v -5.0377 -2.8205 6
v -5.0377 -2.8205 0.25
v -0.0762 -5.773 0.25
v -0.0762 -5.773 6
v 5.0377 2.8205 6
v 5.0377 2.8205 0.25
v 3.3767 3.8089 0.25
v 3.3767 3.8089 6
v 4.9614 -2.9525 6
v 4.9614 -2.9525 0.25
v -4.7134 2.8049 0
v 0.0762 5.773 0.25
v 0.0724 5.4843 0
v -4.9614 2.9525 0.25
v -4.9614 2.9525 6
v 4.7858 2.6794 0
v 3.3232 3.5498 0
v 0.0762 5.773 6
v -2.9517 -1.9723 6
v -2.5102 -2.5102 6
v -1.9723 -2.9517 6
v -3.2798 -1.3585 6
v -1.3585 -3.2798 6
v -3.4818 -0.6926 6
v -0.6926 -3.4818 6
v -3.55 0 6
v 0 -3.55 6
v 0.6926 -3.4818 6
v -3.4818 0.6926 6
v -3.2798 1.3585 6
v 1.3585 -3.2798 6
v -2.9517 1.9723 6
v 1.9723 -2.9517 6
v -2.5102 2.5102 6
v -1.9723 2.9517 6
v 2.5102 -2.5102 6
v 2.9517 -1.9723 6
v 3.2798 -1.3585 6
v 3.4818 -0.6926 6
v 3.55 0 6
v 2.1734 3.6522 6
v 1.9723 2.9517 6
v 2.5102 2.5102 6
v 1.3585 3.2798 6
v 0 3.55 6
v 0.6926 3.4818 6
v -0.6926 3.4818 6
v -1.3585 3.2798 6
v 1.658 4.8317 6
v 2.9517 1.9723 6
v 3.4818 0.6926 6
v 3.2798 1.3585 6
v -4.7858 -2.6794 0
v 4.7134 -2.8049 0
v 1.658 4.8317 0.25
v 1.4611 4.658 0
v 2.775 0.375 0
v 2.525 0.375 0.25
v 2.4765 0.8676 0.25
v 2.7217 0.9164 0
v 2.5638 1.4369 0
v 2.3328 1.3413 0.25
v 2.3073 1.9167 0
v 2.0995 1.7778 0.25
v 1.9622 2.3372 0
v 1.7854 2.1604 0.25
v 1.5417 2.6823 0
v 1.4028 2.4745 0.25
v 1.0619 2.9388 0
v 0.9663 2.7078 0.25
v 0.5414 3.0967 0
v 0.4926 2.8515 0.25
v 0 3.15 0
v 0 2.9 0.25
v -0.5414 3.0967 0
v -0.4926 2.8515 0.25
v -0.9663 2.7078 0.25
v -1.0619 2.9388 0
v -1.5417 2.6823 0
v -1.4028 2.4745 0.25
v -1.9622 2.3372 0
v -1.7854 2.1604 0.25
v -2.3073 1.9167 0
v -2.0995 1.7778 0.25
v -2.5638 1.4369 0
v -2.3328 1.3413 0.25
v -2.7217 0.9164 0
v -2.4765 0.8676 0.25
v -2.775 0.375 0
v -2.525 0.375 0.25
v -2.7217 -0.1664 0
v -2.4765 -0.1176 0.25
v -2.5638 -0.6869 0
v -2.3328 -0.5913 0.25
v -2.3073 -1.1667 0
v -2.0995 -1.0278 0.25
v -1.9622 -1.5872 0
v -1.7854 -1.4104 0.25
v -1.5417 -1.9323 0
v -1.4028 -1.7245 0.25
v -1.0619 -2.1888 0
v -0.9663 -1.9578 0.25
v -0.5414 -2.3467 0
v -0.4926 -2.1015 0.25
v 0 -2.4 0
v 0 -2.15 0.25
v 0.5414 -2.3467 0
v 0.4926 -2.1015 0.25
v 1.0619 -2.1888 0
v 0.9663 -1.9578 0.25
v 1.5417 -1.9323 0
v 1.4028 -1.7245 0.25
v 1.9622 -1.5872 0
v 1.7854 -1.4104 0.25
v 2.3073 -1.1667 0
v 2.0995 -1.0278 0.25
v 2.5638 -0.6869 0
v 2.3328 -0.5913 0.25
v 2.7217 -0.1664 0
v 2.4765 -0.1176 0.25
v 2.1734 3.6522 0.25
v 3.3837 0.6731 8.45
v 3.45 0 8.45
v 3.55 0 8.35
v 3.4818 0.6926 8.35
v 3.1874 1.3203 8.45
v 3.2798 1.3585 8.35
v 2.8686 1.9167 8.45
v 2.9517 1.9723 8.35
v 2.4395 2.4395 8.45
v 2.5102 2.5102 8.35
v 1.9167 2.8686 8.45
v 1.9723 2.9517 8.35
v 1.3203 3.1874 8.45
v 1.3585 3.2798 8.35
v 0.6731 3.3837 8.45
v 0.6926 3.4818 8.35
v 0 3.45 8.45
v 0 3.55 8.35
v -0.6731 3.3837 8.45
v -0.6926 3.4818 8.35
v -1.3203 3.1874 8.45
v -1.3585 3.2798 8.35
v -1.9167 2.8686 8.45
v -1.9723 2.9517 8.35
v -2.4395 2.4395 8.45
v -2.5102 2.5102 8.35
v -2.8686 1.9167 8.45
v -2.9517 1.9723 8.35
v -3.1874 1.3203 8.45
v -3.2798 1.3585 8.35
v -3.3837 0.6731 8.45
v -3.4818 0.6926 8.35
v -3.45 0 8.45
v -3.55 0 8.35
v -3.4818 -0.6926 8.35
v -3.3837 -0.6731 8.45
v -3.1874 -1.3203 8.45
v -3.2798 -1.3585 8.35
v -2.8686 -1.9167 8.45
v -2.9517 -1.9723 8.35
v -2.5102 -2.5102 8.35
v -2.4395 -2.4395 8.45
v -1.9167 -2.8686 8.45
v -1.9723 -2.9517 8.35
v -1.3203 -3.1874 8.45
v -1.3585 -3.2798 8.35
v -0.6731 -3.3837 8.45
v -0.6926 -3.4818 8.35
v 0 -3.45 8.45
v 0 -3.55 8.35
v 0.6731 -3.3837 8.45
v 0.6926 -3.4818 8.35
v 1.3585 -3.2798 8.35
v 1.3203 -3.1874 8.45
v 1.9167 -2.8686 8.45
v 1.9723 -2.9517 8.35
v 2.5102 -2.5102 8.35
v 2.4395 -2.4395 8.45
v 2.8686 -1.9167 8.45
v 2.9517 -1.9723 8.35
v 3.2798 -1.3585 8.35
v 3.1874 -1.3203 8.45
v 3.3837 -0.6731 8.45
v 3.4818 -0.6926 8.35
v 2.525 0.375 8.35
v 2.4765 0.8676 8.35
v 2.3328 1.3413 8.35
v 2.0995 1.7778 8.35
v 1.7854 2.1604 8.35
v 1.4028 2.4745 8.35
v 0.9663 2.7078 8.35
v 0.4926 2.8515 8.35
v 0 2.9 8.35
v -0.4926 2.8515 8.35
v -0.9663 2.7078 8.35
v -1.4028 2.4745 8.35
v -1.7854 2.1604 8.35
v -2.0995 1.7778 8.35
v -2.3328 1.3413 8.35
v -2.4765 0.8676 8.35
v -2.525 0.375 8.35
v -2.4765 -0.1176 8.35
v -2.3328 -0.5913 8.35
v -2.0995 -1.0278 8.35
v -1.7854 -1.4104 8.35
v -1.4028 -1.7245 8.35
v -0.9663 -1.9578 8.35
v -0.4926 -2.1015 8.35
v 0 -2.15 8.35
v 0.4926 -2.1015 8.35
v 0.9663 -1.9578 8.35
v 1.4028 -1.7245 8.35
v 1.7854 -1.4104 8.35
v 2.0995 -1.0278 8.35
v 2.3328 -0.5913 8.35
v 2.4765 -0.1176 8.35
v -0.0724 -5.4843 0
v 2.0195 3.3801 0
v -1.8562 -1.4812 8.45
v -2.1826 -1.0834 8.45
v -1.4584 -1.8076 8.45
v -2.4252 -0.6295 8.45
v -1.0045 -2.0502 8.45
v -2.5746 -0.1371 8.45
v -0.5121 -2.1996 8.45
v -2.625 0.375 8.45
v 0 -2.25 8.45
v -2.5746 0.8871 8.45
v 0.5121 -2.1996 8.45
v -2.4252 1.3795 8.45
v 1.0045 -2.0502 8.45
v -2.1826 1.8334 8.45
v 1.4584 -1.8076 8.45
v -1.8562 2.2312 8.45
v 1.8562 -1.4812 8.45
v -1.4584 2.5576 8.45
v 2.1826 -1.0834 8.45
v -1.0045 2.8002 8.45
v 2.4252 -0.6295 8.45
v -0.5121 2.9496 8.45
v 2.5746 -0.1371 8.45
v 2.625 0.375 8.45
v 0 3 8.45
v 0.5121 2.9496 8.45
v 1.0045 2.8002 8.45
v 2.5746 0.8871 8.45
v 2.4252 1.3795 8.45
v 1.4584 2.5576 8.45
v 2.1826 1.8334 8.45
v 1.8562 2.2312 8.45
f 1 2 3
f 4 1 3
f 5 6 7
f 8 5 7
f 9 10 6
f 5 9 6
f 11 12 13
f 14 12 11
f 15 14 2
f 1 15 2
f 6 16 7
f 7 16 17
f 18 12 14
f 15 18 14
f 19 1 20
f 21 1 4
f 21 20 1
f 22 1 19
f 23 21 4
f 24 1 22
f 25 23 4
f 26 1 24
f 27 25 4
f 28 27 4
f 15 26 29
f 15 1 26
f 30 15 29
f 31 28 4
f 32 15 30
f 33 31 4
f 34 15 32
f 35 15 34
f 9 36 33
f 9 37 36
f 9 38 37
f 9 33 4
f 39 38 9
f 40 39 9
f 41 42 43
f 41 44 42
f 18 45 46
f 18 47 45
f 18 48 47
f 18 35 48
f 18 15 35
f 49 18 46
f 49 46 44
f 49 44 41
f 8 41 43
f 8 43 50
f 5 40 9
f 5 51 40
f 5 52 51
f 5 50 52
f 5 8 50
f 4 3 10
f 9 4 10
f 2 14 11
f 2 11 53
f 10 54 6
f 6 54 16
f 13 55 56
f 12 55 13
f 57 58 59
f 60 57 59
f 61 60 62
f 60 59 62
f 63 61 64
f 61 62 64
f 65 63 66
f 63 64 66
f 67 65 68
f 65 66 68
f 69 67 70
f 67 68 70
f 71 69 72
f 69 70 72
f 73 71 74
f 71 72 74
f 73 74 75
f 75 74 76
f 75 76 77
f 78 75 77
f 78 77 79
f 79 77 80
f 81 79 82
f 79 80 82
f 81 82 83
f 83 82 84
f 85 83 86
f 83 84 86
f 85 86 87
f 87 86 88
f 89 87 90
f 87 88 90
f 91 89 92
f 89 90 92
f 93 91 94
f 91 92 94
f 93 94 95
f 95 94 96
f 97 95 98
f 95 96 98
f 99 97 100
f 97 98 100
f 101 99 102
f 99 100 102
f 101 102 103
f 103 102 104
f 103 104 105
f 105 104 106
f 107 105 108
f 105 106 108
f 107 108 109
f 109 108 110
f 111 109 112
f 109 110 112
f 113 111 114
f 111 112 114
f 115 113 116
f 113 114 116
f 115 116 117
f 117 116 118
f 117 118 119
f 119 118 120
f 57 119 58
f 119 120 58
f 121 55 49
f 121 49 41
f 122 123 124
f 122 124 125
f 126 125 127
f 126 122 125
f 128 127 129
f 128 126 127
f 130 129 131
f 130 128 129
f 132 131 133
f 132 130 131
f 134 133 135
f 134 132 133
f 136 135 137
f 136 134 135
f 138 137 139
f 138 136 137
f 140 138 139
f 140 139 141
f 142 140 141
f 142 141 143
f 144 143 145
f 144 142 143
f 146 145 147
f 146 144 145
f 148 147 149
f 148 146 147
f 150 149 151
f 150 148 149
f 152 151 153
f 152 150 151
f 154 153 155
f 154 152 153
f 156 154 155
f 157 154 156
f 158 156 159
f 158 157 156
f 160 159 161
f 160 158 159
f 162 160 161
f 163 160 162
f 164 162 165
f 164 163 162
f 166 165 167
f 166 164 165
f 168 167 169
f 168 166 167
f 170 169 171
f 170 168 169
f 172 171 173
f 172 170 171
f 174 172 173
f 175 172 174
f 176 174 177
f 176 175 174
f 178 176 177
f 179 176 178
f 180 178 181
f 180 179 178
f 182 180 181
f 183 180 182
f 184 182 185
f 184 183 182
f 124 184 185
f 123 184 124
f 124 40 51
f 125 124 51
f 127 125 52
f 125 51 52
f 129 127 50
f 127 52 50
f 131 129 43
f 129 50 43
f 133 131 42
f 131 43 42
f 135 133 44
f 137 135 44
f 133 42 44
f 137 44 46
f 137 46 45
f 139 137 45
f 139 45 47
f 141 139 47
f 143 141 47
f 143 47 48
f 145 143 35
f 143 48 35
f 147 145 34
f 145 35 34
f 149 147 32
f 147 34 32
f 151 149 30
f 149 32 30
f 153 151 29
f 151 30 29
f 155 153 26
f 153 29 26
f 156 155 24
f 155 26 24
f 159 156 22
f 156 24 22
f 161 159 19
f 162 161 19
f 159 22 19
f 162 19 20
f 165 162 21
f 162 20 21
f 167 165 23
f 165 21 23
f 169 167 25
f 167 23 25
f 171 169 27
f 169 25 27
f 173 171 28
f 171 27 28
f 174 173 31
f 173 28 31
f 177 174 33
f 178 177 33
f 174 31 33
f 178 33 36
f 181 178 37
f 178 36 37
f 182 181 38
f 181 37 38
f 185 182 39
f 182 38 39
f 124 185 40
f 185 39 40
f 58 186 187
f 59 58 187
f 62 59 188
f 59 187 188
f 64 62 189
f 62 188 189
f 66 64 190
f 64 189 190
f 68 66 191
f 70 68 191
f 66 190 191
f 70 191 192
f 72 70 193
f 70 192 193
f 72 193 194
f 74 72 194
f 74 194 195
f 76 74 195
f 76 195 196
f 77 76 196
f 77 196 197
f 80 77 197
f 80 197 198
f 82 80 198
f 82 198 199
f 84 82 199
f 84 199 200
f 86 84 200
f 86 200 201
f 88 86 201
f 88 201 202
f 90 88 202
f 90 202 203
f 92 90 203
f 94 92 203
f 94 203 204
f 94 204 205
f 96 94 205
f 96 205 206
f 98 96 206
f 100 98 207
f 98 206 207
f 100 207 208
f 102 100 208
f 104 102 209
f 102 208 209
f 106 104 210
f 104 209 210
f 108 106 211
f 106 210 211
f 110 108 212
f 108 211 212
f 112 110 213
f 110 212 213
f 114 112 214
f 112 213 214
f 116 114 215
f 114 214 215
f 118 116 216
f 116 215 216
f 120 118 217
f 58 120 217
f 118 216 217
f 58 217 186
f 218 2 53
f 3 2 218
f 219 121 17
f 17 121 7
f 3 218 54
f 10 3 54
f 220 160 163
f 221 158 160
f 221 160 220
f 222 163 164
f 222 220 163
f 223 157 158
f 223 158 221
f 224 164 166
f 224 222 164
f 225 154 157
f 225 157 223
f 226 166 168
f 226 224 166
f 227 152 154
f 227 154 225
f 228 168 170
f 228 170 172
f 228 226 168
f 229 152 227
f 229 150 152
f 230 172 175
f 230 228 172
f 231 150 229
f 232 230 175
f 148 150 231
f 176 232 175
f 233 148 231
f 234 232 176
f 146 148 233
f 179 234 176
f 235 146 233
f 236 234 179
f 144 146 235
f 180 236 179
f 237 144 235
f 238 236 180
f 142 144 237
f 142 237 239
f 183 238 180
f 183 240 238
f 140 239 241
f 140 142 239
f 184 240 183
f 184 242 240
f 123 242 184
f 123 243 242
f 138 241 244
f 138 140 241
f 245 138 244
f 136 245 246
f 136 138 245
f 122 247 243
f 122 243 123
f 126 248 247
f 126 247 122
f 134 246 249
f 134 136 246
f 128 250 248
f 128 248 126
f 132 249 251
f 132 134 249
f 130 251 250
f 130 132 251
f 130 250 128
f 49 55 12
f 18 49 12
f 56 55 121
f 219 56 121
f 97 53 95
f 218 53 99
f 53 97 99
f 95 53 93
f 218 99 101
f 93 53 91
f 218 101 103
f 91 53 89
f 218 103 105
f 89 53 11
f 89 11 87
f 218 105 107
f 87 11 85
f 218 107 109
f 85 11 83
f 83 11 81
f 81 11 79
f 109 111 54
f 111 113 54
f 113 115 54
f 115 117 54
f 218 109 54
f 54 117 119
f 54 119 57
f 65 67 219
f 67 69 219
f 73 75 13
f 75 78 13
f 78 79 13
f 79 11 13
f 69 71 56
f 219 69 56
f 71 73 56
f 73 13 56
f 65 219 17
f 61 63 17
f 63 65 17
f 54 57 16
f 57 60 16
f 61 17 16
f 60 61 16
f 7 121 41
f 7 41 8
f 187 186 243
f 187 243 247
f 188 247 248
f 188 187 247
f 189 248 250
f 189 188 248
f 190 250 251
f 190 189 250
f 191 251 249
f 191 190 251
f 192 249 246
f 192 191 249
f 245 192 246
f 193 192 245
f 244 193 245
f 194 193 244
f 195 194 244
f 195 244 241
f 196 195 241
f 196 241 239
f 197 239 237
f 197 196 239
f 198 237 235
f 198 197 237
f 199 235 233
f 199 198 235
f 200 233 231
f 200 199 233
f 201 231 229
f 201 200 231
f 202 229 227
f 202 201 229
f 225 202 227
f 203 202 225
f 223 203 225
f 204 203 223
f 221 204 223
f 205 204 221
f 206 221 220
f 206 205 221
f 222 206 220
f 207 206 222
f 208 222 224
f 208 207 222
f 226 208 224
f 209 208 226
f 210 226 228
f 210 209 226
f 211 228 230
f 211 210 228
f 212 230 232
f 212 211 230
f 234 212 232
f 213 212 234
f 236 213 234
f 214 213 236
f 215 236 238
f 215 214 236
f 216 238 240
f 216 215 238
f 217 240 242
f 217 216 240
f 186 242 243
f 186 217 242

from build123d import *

# Parameters (mm, degrees)
RESSALTO_EXTRUS_O1_DEPTH = 6
ESBO_O2_R                = 3.55
RESSALTO_EXTRUS_O2_DEPTH = 2.45
CORTE_EXTRUS_O1_DEPTH    = 12.406502719
CORTE_EXTRUS_O2_REACH    = 13.407
ESBO_O4_R                = 2.525
CHANFRO2_SIZE            = 0.25
CHANFRO3_SIZE            = 0.1


with BuildPart() as part:
    # Esboço1 → Ressalto-extrusão1 (new body)
    with BuildSketch(Plane.XY):
        Polygon((4.961441577, -2.952529562), (5.037686394, 2.820469664), (0.076244817, 5.772999226), (-4.961441577, 2.952529562), (-5.037686394, -2.820469664), (-0.076244817, -5.772999226), align=None)
    extrude(amount=RESSALTO_EXTRUS_O1_DEPTH)

    # Esboço2 → Ressalto-extrusão2 (add)
    with BuildSketch(Plane.XY.offset(6)):
        Circle(ESBO_O2_R)
    extrude(amount=RESSALTO_EXTRUS_O2_DEPTH)

    # Esboço3 → Corte-extrusão1 (cut, through all)
    with BuildSketch(Plane(origin=(0, 0, 0), x_dir=(-1, 0, 0), z_dir=(0, 0, -1))):
        Polygon((-1.65800996, 4.831698543), (-2.173420765, 3.652224278), (-3.376703738, 3.808912301), align=None)
    extrude(amount=-CORTE_EXTRUS_O1_DEPTH, mode=Mode.SUBTRACT)

    # Esboço4 → Corte-extrusão2 (cut, up to next)
    with BuildSketch(Plane.XY.offset(8.45), mode=Mode.PRIVATE) as corte_extrus_o2_sk1:
        with Locations((0, 0.375)):
            Circle(ESBO_O4_R)
    corte_extrus_o2_tool1 = extrude(corte_extrus_o2_sk1.sketch, amount=-CORTE_EXTRUS_O2_REACH, mode=Mode.PRIVATE) & part.part
    add(corte_extrus_o2_tool1.solids().sort_by_distance((0, 0.375, 8.45))[0], mode=Mode.SUBTRACT)

    # Chanfro2
    chanfro2_edges = [part.edges().sort_by_distance(p)[0] for p in [
        (4.999563986, -0.066029949, 0),
        (2.44259838, -4.362764394, 0),
        (4.207195066, 3.314690983, 0),
        (-2.556965606, -4.296734445, 0),
        (-4.999563986, 0.066029949, 0),
        (-2.44259838, 4.362764394, 0),
        (2.775062251, 3.73056829, 0),
        (0.867127389, 5.302348884, 0),
        (1.915715362, 4.241961411, 0),
        (-2.525, 0.375, 0),
    ]]
    chamfer(chanfro2_edges, length=CHANFRO2_SIZE)

    # Chanfro3
    chanfro3_edges = [part.edges().sort_by_distance(p)[0] for p in [
        (-3.55, 0, 8.45),
        (-2.525, 0.375, 8.45),
    ]]
    chamfer(chanfro3_edges, length=CHANFRO3_SIZE)


solid = part.part
